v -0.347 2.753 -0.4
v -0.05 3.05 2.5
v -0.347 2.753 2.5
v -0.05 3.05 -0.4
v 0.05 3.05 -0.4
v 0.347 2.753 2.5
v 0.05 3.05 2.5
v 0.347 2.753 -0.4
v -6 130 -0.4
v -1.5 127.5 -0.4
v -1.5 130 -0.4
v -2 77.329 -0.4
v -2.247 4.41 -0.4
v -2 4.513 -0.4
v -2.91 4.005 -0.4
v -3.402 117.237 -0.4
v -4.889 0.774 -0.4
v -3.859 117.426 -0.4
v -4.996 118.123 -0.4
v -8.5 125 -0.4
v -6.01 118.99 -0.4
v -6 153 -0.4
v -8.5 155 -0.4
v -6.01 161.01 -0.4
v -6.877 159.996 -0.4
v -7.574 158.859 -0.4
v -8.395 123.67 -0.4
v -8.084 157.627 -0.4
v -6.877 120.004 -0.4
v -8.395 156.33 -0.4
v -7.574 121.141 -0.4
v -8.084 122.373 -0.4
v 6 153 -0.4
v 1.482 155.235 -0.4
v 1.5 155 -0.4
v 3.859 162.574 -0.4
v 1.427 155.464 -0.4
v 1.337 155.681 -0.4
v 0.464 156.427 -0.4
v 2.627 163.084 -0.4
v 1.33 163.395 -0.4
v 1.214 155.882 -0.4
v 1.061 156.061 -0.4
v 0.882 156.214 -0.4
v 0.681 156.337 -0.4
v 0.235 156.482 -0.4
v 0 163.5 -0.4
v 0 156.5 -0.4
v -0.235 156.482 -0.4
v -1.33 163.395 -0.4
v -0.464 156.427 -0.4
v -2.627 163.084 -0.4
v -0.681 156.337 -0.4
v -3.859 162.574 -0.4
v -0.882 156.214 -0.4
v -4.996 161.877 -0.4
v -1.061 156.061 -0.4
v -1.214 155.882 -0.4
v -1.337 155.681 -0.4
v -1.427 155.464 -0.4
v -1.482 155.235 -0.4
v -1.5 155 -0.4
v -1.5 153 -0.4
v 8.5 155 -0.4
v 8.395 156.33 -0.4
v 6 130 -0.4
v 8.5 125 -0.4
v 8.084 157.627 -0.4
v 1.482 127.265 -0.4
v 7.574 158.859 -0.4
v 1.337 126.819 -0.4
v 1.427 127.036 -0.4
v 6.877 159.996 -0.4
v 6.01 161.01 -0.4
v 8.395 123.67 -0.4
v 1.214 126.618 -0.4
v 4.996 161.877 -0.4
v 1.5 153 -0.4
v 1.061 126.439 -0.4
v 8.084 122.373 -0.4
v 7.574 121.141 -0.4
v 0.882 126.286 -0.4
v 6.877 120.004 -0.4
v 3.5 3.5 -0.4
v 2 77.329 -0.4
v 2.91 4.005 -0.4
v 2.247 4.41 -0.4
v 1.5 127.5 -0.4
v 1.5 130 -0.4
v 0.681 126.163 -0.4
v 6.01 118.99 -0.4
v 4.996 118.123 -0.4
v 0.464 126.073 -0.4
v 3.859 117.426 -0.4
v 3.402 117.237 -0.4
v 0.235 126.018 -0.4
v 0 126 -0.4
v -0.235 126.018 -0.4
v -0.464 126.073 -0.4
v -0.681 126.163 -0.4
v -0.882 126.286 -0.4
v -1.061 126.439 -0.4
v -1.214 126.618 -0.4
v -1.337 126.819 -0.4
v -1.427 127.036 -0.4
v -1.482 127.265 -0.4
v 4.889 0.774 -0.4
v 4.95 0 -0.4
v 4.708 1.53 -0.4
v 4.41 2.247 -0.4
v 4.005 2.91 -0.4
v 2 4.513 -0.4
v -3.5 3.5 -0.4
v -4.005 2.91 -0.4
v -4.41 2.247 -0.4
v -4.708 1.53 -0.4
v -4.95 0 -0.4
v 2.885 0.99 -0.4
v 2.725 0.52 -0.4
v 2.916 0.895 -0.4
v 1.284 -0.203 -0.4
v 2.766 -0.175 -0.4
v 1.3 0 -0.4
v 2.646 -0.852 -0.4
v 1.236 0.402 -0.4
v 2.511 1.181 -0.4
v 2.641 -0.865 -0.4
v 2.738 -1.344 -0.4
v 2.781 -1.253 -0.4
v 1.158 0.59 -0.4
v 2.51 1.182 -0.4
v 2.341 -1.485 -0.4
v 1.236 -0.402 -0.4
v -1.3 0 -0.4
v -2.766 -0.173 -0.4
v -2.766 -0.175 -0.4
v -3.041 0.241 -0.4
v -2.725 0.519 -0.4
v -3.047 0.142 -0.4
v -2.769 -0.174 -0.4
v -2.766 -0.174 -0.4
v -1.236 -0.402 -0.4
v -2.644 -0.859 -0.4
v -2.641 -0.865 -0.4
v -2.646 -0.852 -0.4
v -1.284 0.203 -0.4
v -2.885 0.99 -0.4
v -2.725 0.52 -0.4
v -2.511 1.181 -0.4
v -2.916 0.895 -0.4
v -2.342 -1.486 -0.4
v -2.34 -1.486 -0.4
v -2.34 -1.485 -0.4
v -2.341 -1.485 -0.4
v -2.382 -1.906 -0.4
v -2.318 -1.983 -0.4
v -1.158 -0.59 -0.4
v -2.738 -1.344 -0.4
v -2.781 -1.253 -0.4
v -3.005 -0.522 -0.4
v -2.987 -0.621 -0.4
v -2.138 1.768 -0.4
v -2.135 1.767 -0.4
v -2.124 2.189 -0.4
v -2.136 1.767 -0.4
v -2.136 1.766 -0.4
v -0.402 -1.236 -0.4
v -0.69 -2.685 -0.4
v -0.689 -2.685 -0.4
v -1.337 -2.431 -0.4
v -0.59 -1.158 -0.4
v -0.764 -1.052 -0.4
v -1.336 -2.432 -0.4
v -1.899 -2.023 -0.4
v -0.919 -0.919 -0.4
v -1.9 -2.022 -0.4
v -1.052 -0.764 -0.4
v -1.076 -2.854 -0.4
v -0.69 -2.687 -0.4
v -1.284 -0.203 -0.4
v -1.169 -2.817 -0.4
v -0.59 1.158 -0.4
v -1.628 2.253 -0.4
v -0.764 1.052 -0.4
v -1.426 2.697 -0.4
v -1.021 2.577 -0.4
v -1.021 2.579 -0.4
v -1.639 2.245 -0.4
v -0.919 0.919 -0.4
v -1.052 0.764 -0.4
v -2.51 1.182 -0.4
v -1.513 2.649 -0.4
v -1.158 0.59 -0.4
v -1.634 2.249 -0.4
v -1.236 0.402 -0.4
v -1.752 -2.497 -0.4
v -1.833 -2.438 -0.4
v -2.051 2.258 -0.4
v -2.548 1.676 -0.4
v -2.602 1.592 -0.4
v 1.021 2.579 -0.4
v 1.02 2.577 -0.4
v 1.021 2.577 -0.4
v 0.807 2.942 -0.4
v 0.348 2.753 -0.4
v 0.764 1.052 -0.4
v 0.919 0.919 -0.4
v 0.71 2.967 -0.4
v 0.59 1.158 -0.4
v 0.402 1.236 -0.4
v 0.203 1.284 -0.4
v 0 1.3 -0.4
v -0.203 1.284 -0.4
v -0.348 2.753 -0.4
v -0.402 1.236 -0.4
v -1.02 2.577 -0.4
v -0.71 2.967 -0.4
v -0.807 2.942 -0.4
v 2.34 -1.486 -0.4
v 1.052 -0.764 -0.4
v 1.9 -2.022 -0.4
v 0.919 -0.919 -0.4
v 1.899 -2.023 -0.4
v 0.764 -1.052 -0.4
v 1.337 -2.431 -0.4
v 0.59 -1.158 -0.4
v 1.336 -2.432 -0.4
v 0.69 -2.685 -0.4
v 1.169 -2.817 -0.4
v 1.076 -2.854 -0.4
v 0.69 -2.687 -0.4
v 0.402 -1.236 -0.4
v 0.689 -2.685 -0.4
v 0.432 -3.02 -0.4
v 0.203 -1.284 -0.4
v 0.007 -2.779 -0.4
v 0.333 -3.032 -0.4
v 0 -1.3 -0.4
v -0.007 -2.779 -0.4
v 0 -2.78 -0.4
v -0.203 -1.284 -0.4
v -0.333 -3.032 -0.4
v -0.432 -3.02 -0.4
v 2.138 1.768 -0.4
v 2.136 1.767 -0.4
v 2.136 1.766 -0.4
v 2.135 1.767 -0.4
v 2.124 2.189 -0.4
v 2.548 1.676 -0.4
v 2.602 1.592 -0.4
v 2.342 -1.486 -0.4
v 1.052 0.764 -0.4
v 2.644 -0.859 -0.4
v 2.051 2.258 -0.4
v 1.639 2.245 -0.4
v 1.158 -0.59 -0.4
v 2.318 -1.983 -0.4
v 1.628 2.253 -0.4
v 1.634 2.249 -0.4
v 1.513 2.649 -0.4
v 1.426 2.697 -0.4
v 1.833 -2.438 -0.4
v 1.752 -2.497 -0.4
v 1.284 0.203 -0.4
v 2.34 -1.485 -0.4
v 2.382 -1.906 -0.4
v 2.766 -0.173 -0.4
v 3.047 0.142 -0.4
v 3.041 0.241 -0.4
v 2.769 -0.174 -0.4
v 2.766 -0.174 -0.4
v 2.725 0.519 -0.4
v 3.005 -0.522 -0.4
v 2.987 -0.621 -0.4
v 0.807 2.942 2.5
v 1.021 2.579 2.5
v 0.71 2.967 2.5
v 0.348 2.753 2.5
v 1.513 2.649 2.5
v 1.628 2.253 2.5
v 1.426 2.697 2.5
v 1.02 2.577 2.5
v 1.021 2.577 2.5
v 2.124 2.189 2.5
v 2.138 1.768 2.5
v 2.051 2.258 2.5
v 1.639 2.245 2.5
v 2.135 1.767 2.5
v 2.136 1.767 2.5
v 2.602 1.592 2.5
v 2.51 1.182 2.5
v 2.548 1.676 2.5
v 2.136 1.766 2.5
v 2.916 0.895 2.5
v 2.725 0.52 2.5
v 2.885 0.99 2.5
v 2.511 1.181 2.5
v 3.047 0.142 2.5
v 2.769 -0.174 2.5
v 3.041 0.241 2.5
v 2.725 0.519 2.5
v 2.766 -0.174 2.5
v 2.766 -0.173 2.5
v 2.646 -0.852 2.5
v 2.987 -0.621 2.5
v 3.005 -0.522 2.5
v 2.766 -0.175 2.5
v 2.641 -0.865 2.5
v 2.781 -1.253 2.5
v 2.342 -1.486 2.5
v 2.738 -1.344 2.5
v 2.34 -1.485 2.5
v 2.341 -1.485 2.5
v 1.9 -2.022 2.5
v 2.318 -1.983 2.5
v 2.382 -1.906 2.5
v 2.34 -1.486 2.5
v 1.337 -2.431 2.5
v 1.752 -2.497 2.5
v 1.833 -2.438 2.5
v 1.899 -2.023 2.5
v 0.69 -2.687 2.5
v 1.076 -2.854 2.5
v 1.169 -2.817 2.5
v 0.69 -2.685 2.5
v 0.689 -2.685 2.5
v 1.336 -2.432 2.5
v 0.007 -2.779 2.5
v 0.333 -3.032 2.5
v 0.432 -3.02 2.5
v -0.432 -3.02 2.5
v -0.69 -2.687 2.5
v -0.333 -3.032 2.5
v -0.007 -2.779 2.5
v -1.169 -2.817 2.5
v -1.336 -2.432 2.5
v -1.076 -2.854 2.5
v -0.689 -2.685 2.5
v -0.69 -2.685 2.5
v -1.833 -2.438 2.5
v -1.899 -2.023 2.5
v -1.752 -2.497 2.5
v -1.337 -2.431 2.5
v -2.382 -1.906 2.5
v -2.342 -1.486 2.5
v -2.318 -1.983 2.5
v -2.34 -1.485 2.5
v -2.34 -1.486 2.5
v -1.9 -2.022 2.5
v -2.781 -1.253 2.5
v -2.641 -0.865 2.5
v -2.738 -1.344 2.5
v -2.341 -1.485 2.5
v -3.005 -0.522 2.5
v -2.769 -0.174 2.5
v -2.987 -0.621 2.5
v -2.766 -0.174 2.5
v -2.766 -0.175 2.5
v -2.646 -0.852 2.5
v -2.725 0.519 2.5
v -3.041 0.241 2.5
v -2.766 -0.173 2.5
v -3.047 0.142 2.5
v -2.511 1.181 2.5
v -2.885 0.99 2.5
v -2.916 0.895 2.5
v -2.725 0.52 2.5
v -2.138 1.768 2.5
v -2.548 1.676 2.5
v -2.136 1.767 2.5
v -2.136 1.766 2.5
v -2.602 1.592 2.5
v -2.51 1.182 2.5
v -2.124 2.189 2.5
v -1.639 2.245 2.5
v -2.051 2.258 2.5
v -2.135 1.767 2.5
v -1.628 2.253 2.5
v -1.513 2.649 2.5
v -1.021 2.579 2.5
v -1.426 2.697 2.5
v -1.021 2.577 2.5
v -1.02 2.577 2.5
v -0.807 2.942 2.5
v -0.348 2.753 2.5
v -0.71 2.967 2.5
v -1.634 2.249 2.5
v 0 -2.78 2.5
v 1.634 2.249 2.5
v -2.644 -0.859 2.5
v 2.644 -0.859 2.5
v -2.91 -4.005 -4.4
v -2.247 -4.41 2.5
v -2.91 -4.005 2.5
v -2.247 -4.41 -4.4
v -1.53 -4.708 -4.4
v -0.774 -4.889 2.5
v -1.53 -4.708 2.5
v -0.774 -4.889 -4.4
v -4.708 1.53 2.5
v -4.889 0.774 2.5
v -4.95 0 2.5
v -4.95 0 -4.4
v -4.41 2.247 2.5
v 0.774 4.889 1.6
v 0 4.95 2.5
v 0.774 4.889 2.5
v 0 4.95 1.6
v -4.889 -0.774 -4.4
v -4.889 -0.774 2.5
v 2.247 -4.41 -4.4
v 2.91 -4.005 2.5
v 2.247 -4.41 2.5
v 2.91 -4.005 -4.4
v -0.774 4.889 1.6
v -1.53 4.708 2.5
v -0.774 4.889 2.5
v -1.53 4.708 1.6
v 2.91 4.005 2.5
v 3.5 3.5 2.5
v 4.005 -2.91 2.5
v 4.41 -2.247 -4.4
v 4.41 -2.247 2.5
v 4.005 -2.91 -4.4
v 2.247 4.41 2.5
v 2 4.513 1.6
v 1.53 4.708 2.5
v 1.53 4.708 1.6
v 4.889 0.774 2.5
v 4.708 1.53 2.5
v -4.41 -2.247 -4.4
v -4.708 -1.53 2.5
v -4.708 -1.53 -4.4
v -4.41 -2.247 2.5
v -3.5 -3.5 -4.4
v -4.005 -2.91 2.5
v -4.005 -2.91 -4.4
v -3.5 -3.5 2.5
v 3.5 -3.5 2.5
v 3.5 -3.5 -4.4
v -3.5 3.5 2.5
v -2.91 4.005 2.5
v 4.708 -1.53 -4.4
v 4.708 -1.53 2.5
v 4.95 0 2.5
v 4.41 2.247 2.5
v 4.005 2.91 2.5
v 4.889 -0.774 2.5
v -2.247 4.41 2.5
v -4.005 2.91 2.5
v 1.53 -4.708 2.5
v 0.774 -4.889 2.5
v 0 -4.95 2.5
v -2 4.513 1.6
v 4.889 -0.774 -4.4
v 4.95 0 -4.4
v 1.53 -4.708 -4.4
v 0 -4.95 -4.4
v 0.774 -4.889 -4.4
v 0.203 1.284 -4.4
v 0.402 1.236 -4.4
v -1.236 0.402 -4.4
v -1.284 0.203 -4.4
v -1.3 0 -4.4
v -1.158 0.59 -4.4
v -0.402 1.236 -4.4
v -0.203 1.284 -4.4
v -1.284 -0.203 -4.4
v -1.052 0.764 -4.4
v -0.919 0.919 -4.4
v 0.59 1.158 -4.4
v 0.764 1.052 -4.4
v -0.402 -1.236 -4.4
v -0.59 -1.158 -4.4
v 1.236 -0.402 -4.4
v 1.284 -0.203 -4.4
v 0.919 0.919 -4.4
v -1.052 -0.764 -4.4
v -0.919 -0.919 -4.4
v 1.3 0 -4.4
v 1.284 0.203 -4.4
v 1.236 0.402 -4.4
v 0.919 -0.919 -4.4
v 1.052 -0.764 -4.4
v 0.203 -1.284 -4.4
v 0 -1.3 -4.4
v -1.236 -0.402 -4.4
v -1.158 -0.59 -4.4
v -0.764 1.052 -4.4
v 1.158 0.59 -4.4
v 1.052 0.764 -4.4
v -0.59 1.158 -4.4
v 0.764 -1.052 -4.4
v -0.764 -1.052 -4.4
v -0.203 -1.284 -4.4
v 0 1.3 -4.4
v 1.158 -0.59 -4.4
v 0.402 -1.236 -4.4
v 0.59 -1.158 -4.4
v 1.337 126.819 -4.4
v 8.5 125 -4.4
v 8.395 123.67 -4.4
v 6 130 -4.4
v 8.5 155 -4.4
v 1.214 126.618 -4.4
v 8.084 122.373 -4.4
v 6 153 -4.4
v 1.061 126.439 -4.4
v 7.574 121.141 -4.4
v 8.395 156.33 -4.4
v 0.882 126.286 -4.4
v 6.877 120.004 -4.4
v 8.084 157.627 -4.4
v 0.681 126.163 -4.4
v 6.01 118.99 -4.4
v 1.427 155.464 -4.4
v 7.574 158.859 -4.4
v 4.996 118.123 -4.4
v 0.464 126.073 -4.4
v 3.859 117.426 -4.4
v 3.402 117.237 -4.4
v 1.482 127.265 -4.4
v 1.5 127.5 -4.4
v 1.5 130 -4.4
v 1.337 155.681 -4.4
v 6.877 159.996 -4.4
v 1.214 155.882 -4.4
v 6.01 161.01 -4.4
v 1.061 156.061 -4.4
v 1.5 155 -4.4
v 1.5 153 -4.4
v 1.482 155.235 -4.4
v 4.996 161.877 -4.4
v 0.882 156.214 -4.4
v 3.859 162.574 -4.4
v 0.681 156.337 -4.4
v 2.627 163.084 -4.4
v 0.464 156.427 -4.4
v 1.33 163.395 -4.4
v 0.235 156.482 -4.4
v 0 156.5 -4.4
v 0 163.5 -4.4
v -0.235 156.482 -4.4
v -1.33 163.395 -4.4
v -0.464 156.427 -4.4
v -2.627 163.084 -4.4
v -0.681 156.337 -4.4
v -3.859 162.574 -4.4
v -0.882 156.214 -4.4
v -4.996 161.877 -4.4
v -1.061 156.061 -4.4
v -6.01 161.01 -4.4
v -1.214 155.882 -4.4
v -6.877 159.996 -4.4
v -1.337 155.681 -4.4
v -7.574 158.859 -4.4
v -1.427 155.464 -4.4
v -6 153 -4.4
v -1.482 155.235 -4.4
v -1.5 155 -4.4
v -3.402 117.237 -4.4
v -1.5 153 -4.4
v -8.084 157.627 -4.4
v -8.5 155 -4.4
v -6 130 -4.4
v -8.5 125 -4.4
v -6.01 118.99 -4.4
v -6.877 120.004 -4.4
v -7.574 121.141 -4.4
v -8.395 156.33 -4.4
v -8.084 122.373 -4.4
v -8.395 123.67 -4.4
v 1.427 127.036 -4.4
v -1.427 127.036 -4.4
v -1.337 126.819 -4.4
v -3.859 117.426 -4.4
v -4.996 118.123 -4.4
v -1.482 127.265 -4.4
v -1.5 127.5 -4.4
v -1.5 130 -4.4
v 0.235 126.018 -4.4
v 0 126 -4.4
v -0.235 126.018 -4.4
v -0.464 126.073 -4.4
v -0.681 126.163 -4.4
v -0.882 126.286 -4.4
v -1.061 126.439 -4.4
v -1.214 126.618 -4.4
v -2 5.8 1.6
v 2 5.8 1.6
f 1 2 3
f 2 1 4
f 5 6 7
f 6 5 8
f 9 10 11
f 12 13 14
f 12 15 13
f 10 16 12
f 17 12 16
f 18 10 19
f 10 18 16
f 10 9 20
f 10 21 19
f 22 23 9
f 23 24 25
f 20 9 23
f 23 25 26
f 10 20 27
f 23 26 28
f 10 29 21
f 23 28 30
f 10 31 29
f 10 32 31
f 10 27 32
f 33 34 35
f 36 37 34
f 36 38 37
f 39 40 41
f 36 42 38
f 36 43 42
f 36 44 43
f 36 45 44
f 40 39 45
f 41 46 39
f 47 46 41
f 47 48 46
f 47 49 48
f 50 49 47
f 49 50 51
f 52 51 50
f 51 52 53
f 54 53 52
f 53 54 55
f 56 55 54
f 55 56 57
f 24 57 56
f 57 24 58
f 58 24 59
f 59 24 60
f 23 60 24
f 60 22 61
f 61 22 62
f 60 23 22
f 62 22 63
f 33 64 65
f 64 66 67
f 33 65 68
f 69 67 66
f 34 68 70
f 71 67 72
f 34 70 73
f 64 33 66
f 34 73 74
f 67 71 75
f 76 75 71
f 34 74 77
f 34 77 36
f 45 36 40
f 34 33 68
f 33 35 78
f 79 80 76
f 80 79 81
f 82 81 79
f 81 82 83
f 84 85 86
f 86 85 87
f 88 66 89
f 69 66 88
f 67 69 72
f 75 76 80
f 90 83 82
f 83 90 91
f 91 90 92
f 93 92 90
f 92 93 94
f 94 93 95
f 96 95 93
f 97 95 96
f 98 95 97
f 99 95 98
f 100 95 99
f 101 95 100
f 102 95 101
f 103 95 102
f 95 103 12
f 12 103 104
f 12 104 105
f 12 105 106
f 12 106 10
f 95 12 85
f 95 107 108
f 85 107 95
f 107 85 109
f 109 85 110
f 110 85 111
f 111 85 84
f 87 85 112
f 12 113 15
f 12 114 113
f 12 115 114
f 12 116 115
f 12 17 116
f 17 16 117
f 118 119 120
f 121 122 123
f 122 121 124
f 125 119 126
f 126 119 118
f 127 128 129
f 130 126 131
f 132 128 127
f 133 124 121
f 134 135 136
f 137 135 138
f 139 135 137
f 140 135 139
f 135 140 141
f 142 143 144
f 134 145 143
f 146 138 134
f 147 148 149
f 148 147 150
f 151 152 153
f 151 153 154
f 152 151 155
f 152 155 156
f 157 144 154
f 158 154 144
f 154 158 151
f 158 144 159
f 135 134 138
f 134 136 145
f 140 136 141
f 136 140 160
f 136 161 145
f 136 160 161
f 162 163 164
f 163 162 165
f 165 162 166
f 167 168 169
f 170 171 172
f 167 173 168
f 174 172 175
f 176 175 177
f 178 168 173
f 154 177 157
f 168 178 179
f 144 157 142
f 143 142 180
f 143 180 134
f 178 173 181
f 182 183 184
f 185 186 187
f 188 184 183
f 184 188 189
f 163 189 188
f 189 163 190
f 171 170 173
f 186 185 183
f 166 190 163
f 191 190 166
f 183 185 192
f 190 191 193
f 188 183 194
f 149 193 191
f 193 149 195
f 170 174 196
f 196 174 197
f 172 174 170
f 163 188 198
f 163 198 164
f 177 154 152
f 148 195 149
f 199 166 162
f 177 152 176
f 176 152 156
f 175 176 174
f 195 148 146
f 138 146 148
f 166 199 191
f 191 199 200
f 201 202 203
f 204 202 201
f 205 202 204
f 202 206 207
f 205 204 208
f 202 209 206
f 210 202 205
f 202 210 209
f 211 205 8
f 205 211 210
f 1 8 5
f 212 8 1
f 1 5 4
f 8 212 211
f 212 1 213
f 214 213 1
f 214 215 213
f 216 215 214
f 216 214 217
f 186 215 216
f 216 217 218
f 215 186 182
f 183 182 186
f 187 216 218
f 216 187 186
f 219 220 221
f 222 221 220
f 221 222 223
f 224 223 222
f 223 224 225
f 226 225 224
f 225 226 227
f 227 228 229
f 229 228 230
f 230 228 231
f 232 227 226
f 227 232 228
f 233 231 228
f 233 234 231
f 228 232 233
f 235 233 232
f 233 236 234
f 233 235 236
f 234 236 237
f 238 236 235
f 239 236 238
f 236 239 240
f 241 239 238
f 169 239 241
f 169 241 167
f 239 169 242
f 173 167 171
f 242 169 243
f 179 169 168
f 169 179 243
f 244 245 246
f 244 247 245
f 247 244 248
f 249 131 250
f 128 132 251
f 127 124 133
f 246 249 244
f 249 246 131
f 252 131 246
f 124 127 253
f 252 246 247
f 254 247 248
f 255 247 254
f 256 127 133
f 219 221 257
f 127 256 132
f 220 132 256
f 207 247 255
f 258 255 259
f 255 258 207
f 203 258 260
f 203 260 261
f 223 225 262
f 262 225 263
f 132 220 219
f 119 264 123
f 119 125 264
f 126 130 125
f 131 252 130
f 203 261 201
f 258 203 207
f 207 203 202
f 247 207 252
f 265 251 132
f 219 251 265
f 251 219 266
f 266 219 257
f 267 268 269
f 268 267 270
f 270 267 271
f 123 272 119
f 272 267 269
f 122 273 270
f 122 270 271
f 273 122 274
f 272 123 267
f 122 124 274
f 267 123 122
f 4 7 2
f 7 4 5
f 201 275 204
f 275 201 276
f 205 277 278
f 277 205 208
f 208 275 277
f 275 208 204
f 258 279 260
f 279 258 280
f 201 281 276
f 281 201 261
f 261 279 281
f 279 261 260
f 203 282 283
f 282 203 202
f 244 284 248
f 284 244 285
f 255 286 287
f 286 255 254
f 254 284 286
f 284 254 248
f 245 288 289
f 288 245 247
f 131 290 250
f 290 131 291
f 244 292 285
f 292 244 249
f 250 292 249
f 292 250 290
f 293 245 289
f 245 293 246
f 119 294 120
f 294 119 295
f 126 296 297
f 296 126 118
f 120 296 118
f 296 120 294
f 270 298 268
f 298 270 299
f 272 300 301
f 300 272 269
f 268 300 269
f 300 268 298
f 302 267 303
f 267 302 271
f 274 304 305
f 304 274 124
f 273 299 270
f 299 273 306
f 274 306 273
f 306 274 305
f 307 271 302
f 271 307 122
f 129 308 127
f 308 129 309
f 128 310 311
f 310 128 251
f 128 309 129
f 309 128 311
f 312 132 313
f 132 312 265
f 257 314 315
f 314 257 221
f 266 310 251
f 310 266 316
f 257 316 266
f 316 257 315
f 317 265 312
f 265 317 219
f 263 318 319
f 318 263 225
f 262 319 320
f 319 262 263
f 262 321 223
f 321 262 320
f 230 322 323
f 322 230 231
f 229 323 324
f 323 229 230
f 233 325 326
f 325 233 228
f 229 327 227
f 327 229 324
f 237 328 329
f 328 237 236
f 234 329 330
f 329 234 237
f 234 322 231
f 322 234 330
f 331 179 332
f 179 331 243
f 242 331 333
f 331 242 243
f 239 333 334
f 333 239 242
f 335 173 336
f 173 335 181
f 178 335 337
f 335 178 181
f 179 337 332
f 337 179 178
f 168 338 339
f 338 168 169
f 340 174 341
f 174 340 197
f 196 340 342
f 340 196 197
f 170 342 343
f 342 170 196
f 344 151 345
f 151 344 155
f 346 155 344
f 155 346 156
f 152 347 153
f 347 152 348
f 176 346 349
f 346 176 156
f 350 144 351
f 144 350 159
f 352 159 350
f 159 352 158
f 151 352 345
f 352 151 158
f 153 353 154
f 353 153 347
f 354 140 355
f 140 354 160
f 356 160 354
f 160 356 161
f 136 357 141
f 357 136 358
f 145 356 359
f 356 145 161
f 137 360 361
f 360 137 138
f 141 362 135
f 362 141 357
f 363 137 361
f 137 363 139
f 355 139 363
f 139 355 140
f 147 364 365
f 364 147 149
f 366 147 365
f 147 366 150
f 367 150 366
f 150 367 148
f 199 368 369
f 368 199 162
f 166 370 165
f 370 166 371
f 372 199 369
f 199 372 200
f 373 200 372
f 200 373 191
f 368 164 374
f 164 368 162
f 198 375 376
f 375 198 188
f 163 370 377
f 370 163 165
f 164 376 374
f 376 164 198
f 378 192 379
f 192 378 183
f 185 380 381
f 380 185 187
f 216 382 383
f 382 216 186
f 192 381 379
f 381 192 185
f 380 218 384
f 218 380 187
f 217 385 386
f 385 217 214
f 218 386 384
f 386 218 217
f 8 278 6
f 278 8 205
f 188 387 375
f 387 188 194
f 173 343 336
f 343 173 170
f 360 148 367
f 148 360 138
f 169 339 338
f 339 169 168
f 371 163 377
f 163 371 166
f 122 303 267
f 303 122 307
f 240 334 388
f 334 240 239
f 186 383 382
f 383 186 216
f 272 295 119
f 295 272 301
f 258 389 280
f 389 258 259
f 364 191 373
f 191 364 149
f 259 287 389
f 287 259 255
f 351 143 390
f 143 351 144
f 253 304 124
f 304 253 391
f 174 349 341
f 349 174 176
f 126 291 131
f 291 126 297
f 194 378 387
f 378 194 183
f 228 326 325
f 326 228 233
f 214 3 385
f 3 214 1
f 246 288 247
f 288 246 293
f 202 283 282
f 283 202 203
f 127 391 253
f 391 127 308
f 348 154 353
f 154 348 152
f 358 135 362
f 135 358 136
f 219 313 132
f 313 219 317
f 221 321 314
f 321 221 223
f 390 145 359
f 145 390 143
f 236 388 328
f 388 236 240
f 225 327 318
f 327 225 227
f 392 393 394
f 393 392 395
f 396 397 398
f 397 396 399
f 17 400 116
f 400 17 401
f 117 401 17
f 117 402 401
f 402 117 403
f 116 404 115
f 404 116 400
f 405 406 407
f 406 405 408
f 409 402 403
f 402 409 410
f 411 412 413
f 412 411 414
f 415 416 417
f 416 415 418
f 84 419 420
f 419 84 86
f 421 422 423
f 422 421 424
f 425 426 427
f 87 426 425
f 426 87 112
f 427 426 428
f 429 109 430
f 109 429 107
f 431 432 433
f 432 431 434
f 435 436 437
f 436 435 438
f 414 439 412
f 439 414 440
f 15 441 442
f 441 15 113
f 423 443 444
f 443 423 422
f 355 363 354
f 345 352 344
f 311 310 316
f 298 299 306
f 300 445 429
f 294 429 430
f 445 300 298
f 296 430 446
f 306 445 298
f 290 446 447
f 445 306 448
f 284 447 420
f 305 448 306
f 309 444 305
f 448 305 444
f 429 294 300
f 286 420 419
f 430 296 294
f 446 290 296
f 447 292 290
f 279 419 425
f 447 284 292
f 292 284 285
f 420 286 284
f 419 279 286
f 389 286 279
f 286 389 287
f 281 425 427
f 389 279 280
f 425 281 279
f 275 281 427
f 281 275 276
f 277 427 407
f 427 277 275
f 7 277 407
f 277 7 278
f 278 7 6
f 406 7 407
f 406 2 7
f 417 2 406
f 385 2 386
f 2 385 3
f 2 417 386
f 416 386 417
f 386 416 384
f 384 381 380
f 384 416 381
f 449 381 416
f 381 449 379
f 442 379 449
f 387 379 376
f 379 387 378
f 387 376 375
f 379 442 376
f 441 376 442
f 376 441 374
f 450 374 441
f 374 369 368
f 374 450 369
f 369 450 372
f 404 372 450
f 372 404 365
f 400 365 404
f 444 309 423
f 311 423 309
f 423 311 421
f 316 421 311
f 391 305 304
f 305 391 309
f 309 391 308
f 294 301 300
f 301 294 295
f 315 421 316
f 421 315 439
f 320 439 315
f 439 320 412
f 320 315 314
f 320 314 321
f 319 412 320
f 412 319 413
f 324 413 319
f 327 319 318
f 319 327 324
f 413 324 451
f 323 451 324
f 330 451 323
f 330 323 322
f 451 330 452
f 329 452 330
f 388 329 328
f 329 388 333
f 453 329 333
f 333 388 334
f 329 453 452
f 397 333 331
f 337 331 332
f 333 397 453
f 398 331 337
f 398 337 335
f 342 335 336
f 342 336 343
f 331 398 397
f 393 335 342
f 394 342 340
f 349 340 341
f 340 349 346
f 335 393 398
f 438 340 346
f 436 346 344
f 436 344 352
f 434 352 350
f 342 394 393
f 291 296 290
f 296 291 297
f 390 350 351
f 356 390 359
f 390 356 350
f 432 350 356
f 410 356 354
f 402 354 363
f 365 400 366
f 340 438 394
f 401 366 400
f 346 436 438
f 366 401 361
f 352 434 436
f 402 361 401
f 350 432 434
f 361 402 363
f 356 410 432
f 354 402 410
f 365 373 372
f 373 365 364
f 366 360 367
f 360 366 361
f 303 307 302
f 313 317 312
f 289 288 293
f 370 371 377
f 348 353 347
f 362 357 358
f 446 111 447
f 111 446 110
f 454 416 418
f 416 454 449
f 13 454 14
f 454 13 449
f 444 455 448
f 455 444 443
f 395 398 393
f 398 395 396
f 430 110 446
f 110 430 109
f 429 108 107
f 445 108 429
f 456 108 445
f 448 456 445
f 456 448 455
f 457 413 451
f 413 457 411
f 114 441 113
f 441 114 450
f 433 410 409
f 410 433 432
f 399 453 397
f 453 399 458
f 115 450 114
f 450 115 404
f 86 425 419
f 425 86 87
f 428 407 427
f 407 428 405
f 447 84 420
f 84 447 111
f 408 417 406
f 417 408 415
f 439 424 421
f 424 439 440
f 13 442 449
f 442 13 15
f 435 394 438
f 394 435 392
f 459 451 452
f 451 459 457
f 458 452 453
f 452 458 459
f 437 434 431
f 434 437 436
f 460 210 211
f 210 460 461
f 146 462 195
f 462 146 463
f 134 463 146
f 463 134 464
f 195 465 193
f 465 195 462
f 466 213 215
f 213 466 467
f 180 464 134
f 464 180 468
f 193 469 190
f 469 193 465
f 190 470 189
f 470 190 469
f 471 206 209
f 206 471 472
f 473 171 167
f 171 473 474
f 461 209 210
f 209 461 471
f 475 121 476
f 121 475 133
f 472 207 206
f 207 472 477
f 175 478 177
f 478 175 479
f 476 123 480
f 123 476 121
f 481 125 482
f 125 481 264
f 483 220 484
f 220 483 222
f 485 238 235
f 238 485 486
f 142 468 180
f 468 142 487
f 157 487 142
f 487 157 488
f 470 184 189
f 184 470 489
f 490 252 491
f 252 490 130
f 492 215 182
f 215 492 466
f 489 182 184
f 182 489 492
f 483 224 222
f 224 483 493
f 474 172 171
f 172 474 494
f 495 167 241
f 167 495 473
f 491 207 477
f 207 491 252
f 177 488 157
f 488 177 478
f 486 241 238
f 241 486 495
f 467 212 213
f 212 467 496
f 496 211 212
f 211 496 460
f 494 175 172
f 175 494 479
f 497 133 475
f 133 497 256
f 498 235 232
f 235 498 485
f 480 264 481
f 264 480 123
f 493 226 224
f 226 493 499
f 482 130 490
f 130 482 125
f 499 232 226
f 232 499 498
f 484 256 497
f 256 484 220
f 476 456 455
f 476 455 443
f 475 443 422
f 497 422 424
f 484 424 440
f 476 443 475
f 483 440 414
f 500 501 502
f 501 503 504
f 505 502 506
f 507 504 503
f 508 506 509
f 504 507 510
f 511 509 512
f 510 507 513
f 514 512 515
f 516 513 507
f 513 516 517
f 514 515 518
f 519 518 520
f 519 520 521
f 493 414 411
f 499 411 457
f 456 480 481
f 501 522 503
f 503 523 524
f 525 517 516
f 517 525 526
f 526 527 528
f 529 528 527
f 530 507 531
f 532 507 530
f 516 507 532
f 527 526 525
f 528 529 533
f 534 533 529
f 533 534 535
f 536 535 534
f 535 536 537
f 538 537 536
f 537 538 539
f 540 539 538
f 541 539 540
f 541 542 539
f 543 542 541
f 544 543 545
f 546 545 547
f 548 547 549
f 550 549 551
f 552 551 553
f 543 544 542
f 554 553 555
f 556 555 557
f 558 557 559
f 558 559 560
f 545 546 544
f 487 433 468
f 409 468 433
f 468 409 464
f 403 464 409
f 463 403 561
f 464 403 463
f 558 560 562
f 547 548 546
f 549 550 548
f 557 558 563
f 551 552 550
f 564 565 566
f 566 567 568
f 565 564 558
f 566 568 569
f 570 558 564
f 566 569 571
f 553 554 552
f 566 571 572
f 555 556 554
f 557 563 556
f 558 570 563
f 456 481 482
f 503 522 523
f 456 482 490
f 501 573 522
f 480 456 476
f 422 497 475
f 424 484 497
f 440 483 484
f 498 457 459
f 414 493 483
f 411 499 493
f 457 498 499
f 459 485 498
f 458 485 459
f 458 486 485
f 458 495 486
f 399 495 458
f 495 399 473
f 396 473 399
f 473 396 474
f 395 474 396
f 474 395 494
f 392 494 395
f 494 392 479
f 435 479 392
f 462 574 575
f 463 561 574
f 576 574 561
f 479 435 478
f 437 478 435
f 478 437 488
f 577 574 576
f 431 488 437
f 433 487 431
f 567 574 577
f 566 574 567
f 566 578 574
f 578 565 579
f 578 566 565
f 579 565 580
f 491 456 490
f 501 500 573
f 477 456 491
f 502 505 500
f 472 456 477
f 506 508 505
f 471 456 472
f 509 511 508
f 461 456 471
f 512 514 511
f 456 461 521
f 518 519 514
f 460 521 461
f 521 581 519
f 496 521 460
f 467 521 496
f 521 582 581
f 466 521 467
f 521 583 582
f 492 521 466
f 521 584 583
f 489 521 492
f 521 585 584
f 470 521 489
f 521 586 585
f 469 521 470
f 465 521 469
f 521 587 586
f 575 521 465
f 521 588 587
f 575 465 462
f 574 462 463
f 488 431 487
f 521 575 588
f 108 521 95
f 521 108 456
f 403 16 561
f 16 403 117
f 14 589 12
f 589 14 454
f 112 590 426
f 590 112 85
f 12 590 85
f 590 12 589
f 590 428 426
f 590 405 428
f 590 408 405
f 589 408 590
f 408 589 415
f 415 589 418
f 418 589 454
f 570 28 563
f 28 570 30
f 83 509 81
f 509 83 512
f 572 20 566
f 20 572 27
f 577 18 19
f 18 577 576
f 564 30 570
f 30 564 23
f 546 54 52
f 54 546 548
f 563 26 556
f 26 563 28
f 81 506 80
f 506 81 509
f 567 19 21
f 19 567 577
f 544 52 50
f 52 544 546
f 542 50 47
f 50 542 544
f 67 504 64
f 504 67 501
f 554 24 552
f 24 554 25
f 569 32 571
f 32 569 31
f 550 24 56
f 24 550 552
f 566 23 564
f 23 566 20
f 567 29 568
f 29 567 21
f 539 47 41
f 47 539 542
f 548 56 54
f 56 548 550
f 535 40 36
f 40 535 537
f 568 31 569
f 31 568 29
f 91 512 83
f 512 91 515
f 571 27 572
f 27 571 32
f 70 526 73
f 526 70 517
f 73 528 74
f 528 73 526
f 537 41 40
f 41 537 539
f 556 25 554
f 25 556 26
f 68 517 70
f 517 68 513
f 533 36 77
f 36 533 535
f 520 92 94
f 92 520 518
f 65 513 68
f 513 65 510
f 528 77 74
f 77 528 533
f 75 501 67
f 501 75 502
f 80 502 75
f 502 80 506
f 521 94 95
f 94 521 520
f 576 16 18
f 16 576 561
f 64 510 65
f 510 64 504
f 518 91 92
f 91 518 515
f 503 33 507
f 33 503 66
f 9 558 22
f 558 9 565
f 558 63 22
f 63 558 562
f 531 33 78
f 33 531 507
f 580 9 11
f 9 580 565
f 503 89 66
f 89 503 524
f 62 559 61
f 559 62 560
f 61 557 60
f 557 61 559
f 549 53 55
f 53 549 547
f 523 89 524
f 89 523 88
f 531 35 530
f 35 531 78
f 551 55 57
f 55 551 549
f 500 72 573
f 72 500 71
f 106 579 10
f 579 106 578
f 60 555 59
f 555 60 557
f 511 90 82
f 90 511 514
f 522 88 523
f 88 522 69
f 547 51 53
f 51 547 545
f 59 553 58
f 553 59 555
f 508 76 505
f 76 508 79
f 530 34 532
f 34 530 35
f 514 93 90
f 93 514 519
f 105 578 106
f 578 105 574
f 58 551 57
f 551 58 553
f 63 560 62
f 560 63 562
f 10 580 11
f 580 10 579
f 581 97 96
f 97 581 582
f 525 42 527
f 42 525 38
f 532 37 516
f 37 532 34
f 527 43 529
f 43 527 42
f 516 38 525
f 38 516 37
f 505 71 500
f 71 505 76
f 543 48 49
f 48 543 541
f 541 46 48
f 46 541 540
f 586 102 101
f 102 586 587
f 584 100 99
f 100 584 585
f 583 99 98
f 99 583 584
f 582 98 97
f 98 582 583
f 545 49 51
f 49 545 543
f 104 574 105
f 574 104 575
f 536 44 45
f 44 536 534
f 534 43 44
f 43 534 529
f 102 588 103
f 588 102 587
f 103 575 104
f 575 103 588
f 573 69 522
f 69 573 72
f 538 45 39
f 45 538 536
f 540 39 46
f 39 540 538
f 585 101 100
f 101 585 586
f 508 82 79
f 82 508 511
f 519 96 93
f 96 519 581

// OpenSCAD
/**
 *  Parametric servo arm generator for OpenScad
 *  Générateur de palonnier de servo pour OpenScad
 *
 *  Copyright (c) 2012 Charles Rincheval.  All rights reserved.
 *
 *  This library is free software; you can redistribute it and/or
 *  modify it under the terms of the GNU Lesser General Public
 *  License as published by the Free Software Foundation; either
 *  version 2.1 of the License, or (at your option) any later version.
 *
 *  This library is distributed in the hope that it will be useful,
 *  but WITHOUT ANY WARRANTY; without even the implied warranty of
 *  MERCHANTABILITY or FITNESS FOR A PARTICULAR PURPOSE.  See the GNU
 *  Lesser General Public License for more details.
 *
 *  You should have received a copy of the GNU Lesser General Public
 *  License along with this library; if not, write to the Free Software
 *  Foundation, Inc., 51 Franklin St, Fifth Floor, Boston, MA  02110-1301  USA
 *
 *  Last update :
 *  https://github.com/hugokernel/OpenSCAD_ServoArms
 *
 *  http://www.digitalspirit.org/
 */



arm_length = 125;

translate([0,arm_length,-2.4-2]) difference(){
    union(){
        translate([0,-arm_length,+2.4+2.6+2]) demo();
  
        hull(){
            cylinder(r=17/2,h=4);
            translate([0,30,0])cylinder(r=17/2,h=4);
        }
    }
        #translate([-6,5,0])
        { 
            cube([12,23,5]);
            translate([6,-5/2,0]){
                hull(){
                    cylinder(h=5,r=1.5);
                    translate([0,27.5,0]) cylinder(h=5,r=1.5);
                }
            }
        }
}

arm_count = 1; // [1,2,3,4,5,6,7,8]

//  Clear between arm head and servo head (PLA: 0.3, ABS 0.2)
SERVO_HEAD_CLEAR = 0.2; // [0.2,0.3,0.4,0.5]

$fn = 40 / 1;

/**
 *  Head / Tooth parameters
 *  Futaba 3F Standard Spline
 *  http://www.servocity.com/html/futaba_servo_splines.html
 *
 *  First array (head related) :
 *  0. Head external diameter
 *  1. Head heigth
 *  2. Head thickness
 *  3. Head screw diameter
 *
 *  Second array (tooth related) :
 *  0. Tooth count
 *  1. Tooth height
 *  2. Tooth length
 *  3. Tooth width
 */
FUTABA_3F_SPLINE = [
    [5.7, 3, 2.1, 2.6],
    [25, 0.3, 0.7, 0.1]
];

module servo_futaba_3f(length, count) {
    servo_arm(FUTABA_3F_SPLINE, [length, count]);
}

/**
 *  If you want to support a new servo, juste add a new spline definition array
 *  and a module named like servo_XXX_YYY where XXX is servo brand and YYY is the
 *  connection type (3f) or the servo type (s3003)
 */

module servo_standard(length, count) {
    servo_futaba_3f(length, count);
}

/**
 *  Tooth
 *
 *    |<-w->|
 *    |_____|___
 *    /     \  ^h
 *  _/       \_v
 *   |<--l-->|
 *
 *  - tooth length (l)
 *  - tooth width (w)
 *  - tooth height (h)
 *  - height
 *
 */
module servo_head_tooth(length, width, height, head_height) {
    linear_extrude(height = head_height) {
        polygon([[-length / 2, 0], [-width / 2, height], [width / 2, height], [length / 2,0]]);
    }
}

/**
 *  Servo head
 */
module servo_head(params, clear = SERVO_HEAD_CLEAR) {

    head = params[0];
    tooth = params[1];

    head_diameter = head[0];
    head_heigth = head[1];

    tooth_count = tooth[0];
    tooth_height = tooth[1];
    tooth_length = tooth[2];
    tooth_width = tooth[3];

    % cylinder(r = head_diameter / 2, h = head_heigth + 1);

    cylinder(r = head_diameter / 2 - tooth_height + 0.03 + clear, h = head_heigth);

    for (i = [0 : tooth_count]) {
        rotate([0, 0, i * (360 / tooth_count)]) {
            translate([0, head_diameter / 2 - tooth_height + clear, 0]) {
                servo_head_tooth(tooth_length, tooth_width, tooth_height, head_heigth);
            }
        }
    }
}

/**
 *  Servo hold
 *  - Head / Tooth parameters
 *  - Arms params (length and count)
 */
module servo_arm(params, arms) {

    head = params[0];
    tooth = params[1];

    head_diameter = head[0];
    head_heigth = head[1];
    head_thickness = head[2];
    head_screw_diameter = head[3];

    tooth_length = tooth[2];
    tooth_width = tooth[3];

    arm_length = arms[0];
    arm_count = arms[1];

    /**
     *  Servo arm
     *  - length is from center to last hole
     */
    module arm(tooth_length, tooth_width, head_height, head_heigth, hole_count = 1) {

        arm_screw_diameter = 2;

        difference() {
            union() {
                cylinder(r = tooth_width / 2, h = head_heigth);

                linear_extrude(height = head_heigth) {
                    polygon([
                        [-tooth_width / 2, 0], [-tooth_width / 3, tooth_length],
                        [tooth_width / 3, tooth_length], [tooth_width / 2, 0]
                    ]);
                }

                translate([0, tooth_length, 0]) {
                    cylinder(r = tooth_width / 3, h = head_heigth);
                }

                if (tooth_length >= 12) {
                    translate([-head_heigth / 2 + 4, 3.8, -4]) {
                        rotate([90, 0, 0]) {
                            rotate([0, -90, 0]) {
                                linear_extrude(height = head_heigth) {
                                    polygon([
                                        [-tooth_length / 1.7, 4], [0, 4], [0, - head_height + 5],
                                        [-2, - head_height + 5]
                                    ]);
                                }
                            }
                        }
                    }
                }
            }

            // Hole
            for (i = [0 : hole_count - 1]) {
                //translate([0, length - (length / hole_count * i), -1]) {
                translate([0, tooth_length - (4 * i), -1]) {
                    cylinder(r = arm_screw_diameter / 2, h = 10);
                }
            }

            cylinder(r = head_screw_diameter / 2, h = 10);
        }
    }

    difference() {
        translate([0, 0, 0.1]) {
            cylinder(r = head_diameter / 2 + head_thickness, h = head_heigth + 1);
        }

        cylinder(r = head_screw_diameter / 2, h = 10);

        servo_head(params);
    }

    arm_thickness = head_thickness;

    // Arm
    translate([0, 0, head_heigth]) {
        for (i = [0 : arm_count - 1]) {
            rotate([0, 0, i * (360 / arm_count)]) {
                arm(arm_length, head_diameter + arm_thickness * 2, head_heigth, 4);
            }
        }
    }
}

module demo() {
    rotate([0, 180, 0])
        servo_standard(arm_length, arm_count);
}
